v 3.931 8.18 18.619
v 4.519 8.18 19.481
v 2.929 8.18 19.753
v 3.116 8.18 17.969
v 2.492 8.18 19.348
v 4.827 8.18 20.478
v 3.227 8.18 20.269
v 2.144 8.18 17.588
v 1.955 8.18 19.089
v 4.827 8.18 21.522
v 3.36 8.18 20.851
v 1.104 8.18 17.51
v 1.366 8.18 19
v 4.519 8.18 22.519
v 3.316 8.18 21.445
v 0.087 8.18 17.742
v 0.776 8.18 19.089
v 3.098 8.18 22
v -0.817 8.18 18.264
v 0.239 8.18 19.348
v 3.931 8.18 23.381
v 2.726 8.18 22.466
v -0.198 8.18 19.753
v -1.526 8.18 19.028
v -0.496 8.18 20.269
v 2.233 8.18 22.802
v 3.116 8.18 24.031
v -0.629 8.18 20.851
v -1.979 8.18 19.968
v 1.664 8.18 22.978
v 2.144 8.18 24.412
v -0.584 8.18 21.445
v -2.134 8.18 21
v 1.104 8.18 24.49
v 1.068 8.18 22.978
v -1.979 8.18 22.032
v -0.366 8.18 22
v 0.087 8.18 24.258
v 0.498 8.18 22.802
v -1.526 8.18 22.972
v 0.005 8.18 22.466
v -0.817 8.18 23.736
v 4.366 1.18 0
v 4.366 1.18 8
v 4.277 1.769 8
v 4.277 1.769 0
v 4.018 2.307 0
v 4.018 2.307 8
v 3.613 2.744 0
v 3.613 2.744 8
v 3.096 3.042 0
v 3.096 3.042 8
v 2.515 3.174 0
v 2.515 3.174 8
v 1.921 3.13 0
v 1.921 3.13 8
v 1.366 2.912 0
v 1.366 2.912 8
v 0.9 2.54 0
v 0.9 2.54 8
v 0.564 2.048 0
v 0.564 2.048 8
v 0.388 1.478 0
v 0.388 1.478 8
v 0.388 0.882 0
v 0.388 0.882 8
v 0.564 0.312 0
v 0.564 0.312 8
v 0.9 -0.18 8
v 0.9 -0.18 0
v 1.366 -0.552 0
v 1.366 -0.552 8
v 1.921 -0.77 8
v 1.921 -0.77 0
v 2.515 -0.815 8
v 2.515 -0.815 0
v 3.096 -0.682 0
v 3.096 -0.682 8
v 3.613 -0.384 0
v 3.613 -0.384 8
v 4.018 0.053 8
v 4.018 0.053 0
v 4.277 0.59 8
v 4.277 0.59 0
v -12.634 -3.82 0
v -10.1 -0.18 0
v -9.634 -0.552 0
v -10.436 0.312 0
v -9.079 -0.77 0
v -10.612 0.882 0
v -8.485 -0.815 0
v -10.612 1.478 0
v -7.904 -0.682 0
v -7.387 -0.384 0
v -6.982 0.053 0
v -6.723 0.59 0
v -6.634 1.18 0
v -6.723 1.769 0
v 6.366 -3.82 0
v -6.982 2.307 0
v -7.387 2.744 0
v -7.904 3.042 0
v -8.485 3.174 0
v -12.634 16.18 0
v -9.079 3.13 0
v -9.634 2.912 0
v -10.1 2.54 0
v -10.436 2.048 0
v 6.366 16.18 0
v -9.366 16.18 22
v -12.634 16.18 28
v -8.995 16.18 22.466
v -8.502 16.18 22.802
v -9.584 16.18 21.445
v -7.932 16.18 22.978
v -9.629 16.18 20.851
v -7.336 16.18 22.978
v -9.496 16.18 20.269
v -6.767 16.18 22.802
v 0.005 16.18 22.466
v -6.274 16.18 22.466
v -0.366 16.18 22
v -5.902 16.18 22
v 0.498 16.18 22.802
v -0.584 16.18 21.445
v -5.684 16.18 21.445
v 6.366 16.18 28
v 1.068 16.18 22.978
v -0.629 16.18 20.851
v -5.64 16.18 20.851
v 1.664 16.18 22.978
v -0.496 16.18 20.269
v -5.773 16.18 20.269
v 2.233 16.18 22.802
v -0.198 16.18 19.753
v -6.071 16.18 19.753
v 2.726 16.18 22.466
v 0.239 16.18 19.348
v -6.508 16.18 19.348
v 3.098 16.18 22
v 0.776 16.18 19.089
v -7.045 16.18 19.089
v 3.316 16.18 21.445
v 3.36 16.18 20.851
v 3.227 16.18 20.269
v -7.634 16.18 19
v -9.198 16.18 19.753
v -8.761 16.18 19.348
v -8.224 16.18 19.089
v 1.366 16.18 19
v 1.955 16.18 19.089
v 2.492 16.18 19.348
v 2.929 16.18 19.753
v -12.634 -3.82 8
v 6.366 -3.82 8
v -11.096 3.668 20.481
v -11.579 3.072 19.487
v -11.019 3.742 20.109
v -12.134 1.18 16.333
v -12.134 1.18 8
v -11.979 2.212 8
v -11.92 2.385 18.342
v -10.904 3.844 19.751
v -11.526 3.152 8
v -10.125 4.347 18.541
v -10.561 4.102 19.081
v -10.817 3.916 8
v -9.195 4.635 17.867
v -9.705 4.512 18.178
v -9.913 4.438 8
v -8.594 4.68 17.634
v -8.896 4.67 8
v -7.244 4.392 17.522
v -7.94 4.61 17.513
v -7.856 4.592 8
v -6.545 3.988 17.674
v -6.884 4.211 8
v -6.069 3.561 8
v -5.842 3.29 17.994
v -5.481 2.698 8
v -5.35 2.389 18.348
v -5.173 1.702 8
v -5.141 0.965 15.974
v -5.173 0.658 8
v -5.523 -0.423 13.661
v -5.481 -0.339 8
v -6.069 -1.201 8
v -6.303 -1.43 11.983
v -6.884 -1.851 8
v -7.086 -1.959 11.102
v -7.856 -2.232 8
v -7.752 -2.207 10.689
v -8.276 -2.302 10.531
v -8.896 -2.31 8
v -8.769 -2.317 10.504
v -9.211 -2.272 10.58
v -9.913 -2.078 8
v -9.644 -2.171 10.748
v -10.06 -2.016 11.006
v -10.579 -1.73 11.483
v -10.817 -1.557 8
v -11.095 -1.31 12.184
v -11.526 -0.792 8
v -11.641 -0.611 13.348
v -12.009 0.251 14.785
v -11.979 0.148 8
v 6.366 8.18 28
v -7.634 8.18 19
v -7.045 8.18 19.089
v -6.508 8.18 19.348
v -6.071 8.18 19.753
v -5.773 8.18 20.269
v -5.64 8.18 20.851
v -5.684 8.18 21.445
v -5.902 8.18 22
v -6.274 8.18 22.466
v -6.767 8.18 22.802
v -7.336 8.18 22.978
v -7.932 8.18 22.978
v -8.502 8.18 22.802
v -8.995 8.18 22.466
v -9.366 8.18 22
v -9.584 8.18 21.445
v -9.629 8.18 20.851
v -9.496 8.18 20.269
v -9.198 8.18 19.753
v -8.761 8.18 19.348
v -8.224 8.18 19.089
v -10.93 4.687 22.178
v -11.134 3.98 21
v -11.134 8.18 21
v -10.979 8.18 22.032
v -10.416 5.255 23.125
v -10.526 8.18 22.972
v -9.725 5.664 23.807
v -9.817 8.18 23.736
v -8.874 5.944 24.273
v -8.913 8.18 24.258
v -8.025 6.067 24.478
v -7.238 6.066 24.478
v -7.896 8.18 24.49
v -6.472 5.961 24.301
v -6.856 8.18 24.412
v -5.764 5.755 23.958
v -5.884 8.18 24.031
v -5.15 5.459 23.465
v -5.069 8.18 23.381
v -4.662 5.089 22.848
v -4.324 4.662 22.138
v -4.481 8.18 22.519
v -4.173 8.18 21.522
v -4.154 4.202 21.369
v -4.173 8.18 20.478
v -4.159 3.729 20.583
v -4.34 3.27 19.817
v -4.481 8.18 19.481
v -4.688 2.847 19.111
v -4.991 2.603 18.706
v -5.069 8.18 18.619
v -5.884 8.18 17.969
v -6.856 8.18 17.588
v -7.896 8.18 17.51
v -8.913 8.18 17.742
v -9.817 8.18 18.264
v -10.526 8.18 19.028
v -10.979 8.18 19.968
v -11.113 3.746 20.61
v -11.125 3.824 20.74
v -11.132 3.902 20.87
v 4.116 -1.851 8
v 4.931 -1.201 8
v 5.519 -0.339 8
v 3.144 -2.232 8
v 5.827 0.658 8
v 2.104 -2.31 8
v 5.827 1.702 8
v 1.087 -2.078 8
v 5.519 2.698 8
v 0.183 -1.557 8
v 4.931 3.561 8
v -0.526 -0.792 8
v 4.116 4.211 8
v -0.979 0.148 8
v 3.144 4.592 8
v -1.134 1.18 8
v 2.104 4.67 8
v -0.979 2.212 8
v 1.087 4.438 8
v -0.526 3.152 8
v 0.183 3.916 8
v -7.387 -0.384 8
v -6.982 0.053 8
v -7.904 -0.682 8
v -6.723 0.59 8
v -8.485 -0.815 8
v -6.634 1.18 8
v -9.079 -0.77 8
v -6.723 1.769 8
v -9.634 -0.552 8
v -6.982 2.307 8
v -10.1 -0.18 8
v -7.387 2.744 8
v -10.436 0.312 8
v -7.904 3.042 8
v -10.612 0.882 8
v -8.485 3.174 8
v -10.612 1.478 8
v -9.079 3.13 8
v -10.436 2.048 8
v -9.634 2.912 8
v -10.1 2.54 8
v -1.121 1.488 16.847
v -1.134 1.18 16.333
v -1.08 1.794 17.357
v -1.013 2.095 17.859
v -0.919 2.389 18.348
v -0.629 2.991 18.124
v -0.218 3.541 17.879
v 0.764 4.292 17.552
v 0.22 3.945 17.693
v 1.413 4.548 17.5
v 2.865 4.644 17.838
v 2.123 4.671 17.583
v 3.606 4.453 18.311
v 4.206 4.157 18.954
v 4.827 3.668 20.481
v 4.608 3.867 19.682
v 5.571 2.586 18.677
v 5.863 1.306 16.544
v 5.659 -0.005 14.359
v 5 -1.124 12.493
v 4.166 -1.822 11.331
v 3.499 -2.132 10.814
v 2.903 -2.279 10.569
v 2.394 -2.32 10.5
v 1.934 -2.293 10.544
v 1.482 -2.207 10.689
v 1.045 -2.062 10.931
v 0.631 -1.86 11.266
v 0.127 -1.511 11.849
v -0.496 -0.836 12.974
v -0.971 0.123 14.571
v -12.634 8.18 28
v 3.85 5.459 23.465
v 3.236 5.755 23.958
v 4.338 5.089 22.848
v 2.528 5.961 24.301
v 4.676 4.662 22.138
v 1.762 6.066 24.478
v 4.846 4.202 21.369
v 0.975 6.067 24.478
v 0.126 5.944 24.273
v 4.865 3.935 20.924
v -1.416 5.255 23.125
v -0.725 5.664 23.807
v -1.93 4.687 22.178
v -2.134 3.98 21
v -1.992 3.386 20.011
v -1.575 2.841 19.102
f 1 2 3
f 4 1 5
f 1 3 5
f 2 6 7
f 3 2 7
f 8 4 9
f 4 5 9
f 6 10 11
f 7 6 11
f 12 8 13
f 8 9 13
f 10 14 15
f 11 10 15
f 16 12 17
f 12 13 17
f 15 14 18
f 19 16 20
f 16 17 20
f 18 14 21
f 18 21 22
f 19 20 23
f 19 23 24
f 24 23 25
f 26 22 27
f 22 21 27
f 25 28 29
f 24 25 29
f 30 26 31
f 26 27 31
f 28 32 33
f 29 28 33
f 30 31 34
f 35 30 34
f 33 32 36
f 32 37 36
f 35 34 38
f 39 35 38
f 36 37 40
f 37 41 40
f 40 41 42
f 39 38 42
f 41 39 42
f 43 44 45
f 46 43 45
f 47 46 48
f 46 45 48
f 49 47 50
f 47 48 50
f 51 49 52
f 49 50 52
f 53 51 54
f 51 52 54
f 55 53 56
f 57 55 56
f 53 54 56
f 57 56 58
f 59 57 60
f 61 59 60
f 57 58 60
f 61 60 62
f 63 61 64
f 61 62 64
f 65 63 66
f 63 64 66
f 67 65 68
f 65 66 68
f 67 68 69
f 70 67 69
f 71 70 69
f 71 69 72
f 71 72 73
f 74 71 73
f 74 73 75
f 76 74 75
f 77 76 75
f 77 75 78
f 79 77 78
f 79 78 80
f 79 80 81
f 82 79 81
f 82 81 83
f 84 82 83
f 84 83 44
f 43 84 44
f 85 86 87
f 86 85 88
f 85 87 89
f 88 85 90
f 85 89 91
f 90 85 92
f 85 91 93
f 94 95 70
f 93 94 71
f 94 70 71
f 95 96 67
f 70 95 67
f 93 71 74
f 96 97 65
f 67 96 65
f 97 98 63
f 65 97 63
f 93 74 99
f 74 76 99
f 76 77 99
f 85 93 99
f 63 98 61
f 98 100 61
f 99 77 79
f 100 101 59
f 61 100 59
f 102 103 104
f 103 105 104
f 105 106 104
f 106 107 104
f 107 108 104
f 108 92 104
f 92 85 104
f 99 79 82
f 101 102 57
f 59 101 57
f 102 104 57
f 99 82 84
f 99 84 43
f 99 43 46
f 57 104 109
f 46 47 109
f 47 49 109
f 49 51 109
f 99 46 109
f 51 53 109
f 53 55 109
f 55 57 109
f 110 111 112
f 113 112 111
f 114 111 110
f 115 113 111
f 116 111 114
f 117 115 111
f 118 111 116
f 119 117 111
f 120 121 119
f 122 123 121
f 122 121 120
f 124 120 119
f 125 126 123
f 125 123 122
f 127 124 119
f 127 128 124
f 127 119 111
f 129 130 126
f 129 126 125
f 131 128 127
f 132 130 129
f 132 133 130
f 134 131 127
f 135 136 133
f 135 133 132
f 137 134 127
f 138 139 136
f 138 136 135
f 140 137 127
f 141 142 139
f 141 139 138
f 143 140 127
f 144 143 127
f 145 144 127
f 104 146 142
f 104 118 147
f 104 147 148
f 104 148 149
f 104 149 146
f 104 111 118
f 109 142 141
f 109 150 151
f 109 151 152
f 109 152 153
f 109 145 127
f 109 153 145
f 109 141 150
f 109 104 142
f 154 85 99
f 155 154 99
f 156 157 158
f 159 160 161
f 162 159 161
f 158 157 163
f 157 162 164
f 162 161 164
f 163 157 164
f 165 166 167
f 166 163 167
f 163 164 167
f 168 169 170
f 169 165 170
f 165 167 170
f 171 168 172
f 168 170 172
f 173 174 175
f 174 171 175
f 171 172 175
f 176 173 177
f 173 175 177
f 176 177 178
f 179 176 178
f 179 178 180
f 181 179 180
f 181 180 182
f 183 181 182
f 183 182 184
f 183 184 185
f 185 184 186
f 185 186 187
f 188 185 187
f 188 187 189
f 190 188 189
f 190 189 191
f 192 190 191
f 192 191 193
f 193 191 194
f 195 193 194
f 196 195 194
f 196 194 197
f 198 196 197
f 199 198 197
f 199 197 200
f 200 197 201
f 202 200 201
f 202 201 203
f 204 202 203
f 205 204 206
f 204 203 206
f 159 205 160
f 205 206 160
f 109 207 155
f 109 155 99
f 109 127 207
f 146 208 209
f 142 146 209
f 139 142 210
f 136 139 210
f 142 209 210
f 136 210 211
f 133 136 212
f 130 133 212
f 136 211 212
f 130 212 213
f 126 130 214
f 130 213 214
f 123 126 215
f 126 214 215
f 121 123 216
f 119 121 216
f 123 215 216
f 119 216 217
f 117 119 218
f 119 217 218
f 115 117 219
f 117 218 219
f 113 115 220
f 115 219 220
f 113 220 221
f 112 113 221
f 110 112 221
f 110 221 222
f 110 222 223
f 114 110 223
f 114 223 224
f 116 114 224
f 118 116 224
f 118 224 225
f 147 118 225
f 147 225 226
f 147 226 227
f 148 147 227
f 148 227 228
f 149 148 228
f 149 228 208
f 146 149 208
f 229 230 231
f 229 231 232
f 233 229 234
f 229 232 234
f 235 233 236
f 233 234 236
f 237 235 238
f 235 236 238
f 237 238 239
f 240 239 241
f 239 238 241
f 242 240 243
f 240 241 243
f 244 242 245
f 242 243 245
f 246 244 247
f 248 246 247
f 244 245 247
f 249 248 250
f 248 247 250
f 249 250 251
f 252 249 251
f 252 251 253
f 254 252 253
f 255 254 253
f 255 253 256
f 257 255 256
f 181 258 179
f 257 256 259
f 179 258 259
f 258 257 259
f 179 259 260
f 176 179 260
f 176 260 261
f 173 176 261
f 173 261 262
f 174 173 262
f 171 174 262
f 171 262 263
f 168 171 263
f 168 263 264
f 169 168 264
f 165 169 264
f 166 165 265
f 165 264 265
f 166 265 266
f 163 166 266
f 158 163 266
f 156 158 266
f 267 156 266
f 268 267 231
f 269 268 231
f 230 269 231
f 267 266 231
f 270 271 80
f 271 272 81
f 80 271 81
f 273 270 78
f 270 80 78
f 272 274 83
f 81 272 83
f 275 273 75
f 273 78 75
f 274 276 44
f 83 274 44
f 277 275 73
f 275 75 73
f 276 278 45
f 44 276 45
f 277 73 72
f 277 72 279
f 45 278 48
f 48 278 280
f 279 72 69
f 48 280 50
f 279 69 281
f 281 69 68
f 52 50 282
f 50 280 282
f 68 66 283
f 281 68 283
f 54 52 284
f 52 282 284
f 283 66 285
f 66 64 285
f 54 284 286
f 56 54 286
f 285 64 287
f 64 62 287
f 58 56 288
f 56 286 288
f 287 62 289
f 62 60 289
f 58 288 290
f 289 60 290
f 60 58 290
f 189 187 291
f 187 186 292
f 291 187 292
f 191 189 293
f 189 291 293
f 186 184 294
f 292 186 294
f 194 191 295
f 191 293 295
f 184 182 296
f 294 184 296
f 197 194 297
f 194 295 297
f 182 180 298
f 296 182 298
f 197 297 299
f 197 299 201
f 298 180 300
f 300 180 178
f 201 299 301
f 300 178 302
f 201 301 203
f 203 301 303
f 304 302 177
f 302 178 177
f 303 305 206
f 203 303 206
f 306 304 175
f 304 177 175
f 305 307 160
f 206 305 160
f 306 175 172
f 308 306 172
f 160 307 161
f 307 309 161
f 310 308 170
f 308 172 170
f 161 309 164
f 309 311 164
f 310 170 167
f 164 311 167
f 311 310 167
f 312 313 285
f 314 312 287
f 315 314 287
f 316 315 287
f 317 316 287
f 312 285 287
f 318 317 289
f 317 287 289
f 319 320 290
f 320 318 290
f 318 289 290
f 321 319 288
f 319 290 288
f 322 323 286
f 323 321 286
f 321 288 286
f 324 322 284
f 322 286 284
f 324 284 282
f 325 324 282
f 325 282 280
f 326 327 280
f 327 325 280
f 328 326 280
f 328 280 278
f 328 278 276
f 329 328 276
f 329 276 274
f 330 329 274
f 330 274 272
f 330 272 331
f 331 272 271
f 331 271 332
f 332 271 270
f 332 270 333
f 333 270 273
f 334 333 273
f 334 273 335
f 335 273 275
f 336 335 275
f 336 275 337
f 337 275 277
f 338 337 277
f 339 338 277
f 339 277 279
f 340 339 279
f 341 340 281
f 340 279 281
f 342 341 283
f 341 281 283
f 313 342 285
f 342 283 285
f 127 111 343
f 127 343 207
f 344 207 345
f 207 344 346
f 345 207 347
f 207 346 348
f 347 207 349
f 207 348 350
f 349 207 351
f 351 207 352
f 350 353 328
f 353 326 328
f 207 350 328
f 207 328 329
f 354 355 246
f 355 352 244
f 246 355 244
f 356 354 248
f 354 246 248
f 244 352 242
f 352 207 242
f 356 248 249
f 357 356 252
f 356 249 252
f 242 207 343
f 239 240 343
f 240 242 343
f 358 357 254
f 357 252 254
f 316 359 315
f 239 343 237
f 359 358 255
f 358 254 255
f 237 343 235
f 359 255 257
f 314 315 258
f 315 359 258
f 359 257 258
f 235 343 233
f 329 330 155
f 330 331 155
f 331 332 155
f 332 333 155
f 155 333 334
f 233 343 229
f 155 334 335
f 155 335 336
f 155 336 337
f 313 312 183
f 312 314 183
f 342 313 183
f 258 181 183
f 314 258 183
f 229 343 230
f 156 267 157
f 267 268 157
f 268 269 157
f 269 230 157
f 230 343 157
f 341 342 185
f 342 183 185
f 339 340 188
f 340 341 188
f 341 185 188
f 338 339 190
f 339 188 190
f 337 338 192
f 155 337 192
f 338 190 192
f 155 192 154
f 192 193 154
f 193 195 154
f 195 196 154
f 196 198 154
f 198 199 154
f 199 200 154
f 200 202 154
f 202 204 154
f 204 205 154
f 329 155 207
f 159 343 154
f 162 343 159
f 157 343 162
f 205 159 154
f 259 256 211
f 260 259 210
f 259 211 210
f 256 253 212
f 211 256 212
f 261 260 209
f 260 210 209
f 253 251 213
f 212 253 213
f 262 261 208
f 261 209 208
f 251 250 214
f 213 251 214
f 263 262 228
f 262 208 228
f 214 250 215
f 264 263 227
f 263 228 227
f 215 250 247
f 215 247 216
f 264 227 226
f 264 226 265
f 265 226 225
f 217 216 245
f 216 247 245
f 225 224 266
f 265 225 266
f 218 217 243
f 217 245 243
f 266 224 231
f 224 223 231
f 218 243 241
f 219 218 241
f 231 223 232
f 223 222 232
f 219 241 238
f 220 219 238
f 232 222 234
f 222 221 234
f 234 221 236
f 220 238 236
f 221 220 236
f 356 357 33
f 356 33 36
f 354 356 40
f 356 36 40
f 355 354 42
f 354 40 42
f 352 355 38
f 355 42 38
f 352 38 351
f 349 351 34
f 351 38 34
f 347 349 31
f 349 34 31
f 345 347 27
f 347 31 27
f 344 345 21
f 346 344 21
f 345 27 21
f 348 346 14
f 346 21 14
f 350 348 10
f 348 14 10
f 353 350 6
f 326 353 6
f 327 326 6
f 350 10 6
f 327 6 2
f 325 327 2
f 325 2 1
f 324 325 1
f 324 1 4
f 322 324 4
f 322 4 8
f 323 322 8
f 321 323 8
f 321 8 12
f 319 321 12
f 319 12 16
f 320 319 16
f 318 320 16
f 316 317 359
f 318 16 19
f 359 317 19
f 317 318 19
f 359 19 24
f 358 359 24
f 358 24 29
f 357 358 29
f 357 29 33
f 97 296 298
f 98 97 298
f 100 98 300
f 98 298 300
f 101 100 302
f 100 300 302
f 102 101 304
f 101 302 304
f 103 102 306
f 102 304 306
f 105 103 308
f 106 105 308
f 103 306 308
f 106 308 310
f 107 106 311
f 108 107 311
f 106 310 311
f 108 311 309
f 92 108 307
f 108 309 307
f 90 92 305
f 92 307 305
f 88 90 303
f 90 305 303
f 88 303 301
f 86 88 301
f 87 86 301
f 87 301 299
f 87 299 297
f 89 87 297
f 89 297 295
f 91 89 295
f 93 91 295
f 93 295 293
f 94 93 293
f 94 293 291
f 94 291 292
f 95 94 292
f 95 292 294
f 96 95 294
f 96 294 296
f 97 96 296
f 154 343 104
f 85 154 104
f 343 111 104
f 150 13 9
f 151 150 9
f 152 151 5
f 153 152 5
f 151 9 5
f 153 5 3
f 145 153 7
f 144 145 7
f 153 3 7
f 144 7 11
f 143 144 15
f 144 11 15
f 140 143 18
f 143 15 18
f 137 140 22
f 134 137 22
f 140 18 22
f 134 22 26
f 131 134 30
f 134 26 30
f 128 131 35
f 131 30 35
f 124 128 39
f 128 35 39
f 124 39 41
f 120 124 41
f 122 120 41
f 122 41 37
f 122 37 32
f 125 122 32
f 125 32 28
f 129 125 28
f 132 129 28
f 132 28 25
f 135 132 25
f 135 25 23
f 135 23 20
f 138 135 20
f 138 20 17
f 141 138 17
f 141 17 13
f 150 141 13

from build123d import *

# Parameters (mm, degrees)
SKETCH1_W           = 19
SKETCH1_H           = 20
BOSS_EXTRUDE1_DEPTH = 8
SKETCH2_W           = 19
SKETCH2_H           = 8
BOSS_EXTRUDE2_DEPTH = 20
SKETCH3_R           = 2
CUT_EXTRUDE1_DEPTH  = 20
SKETCH4_R           = 2
CUT_EXTRUDE2_DEPTH  = 20
BOSS_EXTRUDE3_DEPTH = 19
SKETCH7_R           = 3.5
CUT_EXTRUDE3_DEPTH  = 20
SKETCH8_R           = 3.5
CUT_EXTRUDE4_DEPTH  = 20


with BuildPart() as part:
    # Sketch1 → Boss-Extrude1 (new body)
    with BuildSketch(Plane.XY):
        with Locations((-3.134342089, 6.179897069)):
            Rectangle(SKETCH1_W, SKETCH1_H)
    extrude(amount=BOSS_EXTRUDE1_DEPTH)

    # Sketch2 → Boss-Extrude2 (add)
    with BuildSketch(Plane.XY.offset(8)):
        with Locations((-3.134342089, 12.179897069)):
            Rectangle(SKETCH2_W, SKETCH2_H)
    extrude(amount=BOSS_EXTRUDE2_DEPTH)

    # Sketch3 → Cut-Extrude1 (cut)
    with BuildSketch(Plane.XY.offset(8)):
        with Locations((-8.634342089, 1.179897069)):
            Circle(SKETCH3_R)
        with Locations((2.365657911, 1.179897069)):
            Circle(SKETCH3_R)
    extrude(amount=-CUT_EXTRUDE1_DEPTH, mode=Mode.SUBTRACT)

    # Sketch4 → Cut-Extrude2 (cut)
    with BuildSketch(Plane.XZ.offset(-8.179897069)):
        with Locations(Location((-7.634342089, 21, 0), (0, 0, 270))):
            Circle(SKETCH4_R)
        with Locations(Location((1.365657911, 21, 0), (0, 0, 270))):
            Circle(SKETCH4_R)
    extrude(amount=-CUT_EXTRUDE2_DEPTH, mode=Mode.SUBTRACT)

    # Sketch5 → Boss-Extrude3 (add)
    with BuildSketch(Plane.ZY.offset(12.634342089)):
        Polygon((28, 8.179897069), (8, -3.820102931), (8, 8.179897069), align=None)
    extrude(amount=-BOSS_EXTRUDE3_DEPTH)

    # Sketch7 → Cut-Extrude3 (cut)
    with BuildSketch(Plane(origin=(0, 8.179897069, 0), x_dir=(1, 0, 0), z_dir=(0, 1, 0))):
        with Locations(Location((1.365657911, -21, 0), (0, 0, 180))):
            Circle(SKETCH7_R)
        with Locations(Location((-7.634342089, -21, 0), (0, 0, 180))):
            Circle(SKETCH7_R)
    extrude(amount=-CUT_EXTRUDE3_DEPTH, mode=Mode.SUBTRACT)

    # Sketch8 → Cut-Extrude4 (cut)
    with BuildSketch(Plane(origin=(0, 0, 8), x_dir=(-1, 0, 0), z_dir=(0, 0, -1))):
        with Locations((8.634342089, 1.179897069)):
            Circle(SKETCH8_R)
        with Locations((-2.365657911, 1.179897069)):
            Circle(SKETCH8_R)
    extrude(amount=-CUT_EXTRUDE4_DEPTH, mode=Mode.SUBTRACT)


solid = part.part
